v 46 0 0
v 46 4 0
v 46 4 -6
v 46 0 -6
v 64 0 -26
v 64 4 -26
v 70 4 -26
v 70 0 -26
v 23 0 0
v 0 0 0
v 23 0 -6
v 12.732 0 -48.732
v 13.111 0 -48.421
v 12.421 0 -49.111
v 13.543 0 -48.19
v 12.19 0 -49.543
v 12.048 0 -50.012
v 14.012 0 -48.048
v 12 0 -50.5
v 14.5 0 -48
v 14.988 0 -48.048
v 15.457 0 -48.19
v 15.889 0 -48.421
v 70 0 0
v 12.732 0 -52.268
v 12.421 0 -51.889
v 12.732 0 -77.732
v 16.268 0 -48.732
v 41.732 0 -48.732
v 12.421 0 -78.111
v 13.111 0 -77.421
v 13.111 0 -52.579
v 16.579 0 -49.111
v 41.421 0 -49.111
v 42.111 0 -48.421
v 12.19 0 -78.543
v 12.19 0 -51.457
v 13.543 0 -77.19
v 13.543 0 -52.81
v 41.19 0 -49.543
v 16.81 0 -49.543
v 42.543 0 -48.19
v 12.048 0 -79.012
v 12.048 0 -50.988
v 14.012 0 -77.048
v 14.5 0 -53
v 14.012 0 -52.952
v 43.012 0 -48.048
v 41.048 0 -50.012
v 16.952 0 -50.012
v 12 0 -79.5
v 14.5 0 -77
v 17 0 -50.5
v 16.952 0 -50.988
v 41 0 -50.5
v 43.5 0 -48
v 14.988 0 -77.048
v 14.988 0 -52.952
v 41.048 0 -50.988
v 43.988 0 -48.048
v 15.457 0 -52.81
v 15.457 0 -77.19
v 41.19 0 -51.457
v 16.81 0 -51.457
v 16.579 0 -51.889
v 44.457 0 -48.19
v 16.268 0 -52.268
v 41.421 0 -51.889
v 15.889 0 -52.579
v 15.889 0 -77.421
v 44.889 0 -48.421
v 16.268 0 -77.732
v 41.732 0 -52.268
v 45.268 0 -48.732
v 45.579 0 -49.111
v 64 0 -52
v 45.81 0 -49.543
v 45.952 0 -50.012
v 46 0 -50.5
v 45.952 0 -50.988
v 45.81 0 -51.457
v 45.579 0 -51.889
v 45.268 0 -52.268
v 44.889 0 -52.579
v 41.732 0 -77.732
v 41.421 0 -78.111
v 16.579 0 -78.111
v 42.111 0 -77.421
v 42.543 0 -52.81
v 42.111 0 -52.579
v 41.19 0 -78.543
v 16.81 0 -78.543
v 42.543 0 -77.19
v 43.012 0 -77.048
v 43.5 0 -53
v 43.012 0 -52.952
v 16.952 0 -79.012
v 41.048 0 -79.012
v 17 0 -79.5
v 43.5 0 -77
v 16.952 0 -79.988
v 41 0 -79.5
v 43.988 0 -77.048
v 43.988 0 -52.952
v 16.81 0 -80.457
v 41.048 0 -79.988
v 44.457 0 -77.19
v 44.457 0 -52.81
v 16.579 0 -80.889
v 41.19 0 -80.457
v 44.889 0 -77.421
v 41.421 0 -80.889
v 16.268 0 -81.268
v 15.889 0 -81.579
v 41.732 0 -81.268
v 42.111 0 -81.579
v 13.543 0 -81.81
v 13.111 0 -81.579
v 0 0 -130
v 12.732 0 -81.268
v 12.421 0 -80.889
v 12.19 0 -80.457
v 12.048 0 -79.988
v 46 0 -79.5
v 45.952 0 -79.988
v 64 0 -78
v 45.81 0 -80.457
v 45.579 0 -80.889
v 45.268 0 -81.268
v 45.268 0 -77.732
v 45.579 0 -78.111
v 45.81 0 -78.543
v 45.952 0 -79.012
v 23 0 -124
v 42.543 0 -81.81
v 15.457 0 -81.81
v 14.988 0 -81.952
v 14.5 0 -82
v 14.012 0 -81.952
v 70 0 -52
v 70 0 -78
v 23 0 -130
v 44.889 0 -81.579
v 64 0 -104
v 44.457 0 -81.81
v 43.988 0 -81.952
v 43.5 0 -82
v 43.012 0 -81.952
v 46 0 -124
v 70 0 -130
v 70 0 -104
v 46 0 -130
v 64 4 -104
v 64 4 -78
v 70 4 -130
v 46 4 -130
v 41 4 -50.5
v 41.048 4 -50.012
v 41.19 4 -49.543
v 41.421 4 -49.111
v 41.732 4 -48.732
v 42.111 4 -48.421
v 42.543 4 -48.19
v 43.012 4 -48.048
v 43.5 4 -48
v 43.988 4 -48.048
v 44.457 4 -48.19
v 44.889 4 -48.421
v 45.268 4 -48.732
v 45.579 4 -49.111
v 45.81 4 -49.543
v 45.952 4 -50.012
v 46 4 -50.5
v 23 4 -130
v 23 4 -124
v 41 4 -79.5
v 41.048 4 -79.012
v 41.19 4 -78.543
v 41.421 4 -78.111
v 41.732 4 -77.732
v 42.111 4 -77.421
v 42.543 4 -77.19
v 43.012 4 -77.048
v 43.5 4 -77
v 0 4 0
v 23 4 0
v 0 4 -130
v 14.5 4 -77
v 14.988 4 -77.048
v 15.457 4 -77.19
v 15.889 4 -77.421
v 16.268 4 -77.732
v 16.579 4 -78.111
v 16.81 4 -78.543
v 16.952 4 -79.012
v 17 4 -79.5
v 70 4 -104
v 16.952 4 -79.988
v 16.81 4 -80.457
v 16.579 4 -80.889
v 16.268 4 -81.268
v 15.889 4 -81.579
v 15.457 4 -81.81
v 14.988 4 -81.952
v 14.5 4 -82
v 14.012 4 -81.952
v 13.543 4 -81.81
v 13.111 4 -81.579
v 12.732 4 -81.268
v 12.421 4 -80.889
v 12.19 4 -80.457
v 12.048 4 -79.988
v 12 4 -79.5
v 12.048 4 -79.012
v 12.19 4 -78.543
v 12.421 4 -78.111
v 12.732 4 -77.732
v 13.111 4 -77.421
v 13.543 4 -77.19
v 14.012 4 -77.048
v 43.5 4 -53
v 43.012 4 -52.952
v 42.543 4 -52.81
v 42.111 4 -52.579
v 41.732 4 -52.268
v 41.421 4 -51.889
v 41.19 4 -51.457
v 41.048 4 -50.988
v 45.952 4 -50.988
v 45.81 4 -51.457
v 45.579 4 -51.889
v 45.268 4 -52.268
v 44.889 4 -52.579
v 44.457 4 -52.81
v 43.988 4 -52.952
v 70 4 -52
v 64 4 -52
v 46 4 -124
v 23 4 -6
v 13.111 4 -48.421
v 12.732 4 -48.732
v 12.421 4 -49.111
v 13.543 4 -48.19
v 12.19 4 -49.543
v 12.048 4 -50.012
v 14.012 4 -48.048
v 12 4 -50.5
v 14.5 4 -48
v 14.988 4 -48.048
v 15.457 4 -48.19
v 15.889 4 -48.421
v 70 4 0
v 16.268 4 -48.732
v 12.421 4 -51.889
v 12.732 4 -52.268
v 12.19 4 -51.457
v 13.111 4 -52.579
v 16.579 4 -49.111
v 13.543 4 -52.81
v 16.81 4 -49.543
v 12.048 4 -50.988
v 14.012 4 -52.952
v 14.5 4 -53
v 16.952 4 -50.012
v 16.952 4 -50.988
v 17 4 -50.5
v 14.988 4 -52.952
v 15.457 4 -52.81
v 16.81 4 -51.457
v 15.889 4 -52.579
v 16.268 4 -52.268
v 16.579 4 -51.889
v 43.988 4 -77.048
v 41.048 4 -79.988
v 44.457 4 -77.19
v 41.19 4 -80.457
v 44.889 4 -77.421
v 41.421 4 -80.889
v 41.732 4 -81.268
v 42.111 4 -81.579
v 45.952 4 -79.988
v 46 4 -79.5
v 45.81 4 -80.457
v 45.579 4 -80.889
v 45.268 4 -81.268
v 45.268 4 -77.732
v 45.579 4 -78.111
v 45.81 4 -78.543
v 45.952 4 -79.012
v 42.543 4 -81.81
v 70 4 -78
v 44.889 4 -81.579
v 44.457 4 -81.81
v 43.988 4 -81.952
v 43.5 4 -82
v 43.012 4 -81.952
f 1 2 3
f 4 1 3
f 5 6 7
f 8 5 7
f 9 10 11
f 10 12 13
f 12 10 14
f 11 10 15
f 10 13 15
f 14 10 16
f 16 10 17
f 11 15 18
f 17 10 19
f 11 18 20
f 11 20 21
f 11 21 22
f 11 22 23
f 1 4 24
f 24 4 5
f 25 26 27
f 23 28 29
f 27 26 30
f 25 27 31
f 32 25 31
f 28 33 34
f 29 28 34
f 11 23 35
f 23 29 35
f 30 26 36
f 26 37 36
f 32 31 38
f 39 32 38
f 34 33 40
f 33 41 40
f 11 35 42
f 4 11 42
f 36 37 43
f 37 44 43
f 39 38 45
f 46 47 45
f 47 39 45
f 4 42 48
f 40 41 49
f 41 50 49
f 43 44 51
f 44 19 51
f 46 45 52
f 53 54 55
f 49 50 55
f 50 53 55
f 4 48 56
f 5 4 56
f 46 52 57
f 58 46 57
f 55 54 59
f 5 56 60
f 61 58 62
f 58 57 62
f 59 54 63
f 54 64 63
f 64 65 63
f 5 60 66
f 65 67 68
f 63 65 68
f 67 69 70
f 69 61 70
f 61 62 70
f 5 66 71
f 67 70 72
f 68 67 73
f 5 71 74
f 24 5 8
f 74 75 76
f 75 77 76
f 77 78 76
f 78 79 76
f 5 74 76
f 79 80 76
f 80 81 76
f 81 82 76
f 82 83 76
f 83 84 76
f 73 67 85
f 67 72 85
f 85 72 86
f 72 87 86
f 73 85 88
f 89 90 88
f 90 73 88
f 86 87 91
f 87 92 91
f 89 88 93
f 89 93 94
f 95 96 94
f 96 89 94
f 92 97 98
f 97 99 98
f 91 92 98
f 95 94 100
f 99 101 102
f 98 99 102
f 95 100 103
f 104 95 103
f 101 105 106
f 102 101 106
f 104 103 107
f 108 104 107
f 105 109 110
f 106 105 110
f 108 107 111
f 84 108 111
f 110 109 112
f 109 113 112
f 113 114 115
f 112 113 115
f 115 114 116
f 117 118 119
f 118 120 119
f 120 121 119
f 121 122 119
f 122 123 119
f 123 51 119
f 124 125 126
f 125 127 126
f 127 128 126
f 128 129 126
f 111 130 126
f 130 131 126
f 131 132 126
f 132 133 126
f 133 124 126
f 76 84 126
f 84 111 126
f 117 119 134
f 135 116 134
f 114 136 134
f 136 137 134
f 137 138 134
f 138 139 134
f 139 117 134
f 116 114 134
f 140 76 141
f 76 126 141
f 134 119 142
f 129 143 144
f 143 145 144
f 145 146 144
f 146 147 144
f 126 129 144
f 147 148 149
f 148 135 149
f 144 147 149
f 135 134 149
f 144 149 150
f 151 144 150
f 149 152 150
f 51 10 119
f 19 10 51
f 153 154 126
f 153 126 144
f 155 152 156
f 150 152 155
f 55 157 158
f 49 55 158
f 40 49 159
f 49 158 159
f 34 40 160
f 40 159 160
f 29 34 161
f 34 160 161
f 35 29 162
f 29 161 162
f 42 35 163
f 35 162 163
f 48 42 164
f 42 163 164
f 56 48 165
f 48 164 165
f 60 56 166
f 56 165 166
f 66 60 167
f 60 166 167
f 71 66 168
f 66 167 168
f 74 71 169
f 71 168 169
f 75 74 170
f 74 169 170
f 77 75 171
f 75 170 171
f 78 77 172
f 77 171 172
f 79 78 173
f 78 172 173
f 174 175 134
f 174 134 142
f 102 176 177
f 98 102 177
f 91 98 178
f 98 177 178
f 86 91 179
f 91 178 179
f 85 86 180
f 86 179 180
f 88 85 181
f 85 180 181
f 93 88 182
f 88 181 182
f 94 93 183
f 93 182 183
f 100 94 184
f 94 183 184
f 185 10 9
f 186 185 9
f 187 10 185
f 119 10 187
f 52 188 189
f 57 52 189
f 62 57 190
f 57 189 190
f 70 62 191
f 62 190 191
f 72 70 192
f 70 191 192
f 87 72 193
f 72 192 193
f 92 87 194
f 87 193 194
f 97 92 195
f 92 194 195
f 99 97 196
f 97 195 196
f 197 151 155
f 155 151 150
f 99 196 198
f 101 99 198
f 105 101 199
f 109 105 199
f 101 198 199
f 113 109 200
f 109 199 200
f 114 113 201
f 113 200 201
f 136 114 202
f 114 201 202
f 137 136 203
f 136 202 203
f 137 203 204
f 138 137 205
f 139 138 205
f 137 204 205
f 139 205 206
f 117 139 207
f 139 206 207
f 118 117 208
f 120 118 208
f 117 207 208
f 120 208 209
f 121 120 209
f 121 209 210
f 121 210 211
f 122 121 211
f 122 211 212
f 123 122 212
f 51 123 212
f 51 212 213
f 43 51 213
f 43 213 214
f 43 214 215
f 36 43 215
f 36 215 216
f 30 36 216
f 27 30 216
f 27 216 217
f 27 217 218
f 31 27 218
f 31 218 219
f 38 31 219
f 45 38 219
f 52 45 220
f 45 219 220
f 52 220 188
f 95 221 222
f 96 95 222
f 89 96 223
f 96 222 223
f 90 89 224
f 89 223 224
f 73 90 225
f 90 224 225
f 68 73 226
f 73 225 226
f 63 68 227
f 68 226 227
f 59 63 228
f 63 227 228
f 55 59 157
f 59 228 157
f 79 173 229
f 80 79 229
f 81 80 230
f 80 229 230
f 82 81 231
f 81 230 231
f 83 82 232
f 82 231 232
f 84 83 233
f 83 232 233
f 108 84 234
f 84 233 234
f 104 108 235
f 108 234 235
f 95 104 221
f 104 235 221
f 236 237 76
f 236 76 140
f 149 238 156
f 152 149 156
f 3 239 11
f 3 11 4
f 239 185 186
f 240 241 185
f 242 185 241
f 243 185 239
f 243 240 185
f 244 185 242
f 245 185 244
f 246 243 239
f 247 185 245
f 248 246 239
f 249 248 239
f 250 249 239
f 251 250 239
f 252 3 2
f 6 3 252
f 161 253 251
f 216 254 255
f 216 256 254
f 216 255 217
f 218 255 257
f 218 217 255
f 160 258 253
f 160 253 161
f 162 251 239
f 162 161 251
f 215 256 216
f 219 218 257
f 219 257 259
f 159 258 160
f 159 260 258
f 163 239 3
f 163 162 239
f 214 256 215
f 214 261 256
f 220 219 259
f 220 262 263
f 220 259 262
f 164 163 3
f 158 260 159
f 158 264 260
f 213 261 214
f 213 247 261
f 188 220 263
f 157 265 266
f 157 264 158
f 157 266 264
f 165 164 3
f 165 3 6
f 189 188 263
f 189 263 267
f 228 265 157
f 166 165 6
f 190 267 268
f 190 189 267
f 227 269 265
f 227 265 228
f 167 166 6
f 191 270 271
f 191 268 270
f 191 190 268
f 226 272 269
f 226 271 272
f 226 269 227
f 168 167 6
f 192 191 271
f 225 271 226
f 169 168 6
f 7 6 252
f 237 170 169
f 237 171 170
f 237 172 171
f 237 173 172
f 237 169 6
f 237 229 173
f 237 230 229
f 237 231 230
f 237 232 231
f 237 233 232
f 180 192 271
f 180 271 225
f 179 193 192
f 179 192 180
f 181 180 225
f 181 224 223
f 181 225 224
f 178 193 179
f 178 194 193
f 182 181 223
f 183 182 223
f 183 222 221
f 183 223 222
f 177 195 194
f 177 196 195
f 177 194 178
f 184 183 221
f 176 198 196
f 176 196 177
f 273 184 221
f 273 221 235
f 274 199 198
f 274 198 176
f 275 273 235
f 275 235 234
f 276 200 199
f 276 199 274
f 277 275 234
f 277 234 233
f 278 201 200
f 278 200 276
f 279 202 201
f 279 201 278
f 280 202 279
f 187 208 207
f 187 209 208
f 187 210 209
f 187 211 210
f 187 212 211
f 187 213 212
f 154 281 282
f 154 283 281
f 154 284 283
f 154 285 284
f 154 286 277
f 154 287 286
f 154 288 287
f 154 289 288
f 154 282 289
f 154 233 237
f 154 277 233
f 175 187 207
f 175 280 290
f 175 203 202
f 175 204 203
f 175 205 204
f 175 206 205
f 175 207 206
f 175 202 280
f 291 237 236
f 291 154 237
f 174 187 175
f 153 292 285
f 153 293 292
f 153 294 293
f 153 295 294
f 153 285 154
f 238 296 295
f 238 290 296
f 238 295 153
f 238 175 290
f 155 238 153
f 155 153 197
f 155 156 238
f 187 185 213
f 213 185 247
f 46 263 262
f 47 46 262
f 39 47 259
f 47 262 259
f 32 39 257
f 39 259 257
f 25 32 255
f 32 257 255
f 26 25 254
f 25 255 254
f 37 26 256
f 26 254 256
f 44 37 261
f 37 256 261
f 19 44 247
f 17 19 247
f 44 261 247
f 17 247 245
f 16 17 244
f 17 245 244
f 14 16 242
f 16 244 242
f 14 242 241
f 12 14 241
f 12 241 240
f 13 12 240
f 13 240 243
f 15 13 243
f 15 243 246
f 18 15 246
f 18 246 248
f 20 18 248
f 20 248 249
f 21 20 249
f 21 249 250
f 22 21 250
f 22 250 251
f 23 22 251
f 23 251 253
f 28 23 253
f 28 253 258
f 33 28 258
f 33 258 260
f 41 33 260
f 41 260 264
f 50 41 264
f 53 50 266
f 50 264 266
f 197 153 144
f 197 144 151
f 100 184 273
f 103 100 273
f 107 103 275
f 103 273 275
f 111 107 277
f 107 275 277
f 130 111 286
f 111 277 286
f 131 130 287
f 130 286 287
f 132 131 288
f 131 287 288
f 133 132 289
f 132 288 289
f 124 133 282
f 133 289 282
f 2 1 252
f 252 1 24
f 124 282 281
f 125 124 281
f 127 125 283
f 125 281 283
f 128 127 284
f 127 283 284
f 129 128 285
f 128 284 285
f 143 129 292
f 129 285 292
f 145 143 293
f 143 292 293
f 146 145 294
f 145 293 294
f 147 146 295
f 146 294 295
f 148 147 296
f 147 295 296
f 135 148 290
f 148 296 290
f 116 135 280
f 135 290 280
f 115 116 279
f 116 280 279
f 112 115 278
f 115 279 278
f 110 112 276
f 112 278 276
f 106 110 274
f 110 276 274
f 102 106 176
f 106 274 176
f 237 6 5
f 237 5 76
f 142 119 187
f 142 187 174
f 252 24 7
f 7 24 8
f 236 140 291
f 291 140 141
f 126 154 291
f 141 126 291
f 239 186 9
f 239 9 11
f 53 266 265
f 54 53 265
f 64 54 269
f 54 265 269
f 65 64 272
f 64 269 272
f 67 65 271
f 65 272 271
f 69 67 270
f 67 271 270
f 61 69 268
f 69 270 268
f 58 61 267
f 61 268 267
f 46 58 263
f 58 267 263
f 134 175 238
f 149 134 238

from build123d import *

# Parameters (mm, degrees)
SKETCH1_W           = 70
SKETCH1_H           = 130
BOSS_EXTRUDE1_DEPTH = 4
CUT_EXTRUDE1_DEPTH  = 148.702403501
SKETCH3_W           = 23
SKETCH3_H           = 6
SKETCH3_W_2         = 6
SKETCH3_H_2         = 26
CUT_EXTRUDE2_DEPTH  = 148.702403501


with BuildPart() as part:
    # Sketch1 → Boss-Extrude1 (new body)
    with BuildSketch(Plane(origin=(0, 0, 0), x_dir=(1, 0, 0), z_dir=(0, 1, 0))):
        with Locations((35, 65)):
            Rectangle(SKETCH1_W, SKETCH1_H)
    extrude(amount=BOSS_EXTRUDE1_DEPTH)

    # Sketch2 → Cut-Extrude1 (cut, through all)
    with BuildSketch(Plane(origin=(0, 4, 0), x_dir=(1, 0, 0), z_dir=(0, 1, 0))):
        with BuildLine():
            ThreePointArc((17, 79.5), (12.732233047, 81.267766953), (14.5, 77))
            Line((14.5, 77), (14.5, 79.5))
            Line((14.5, 79.5), (17, 79.5))
        make_face()
        with BuildLine():
            Line((14.5, 79.5), (14.5, 77))
            ThreePointArc((14.5, 77), (16.267766953, 77.732233047), (17, 79.5))
            Line((17, 79.5), (14.5, 79.5))
        make_face()
        with BuildLine():
            Line((14.5, 53), (14.5, 50.5))
            Line((14.5, 50.5), (17, 50.5))
            ThreePointArc((17, 50.5), (16.267766953, 52.267766953), (14.5, 53))
        make_face()
        with BuildLine():
            Line((17, 50.5), (14.5, 50.5))
            Line((14.5, 50.5), (14.5, 53))
            ThreePointArc((14.5, 53), (12.732233047, 48.732233047), (17, 50.5))
        make_face()
        with BuildLine():
            ThreePointArc((43.5, 53), (41.732233047, 52.267766953), (41, 50.5))
            Line((41, 50.5), (43.5, 50.5))
            Line((43.5, 50.5), (43.5, 53))
        make_face()
        with BuildLine():
            Line((43.5, 50.5), (41, 50.5))
            ThreePointArc((41, 50.5), (43.5, 48), (46, 50.5))
            ThreePointArc((46, 50.5), (45.267766953, 52.267766953), (43.5, 53))
            Line((43.5, 53), (43.5, 50.5))
        make_face()
        with BuildLine():
            ThreePointArc((41, 79.5), (41.732233047, 77.732233047), (43.5, 77))
            Line((43.5, 77), (43.5, 79.5))
            Line((43.5, 79.5), (41, 79.5))
        make_face()
        with BuildLine():
            Line((43.5, 79.5), (43.5, 77))
            ThreePointArc((43.5, 77), (45.267766953, 77.732233047), (46, 79.5))
            ThreePointArc((46, 79.5), (43.5, 82), (41, 79.5))
            Line((41, 79.5), (43.5, 79.5))
        make_face()
    extrude(amount=-CUT_EXTRUDE1_DEPTH, mode=Mode.SUBTRACT)

    # Sketch3 → Cut-Extrude2 (cut, through all)
    with BuildSketch(Plane(origin=(0, 4, 0), x_dir=(1, 0, 0), z_dir=(0, 1, 0))):
        with Locations((34.5, 3)):
            Rectangle(SKETCH3_W, SKETCH3_H)
        with Locations((67, 39)):
            Rectangle(SKETCH3_W_2, SKETCH3_H_2)
        with Locations((67, 91)):
            Rectangle(SKETCH3_W_2, SKETCH3_H_2)
        with Locations((34.5, 127)):
            Rectangle(SKETCH3_W, SKETCH3_H)
    extrude(amount=-CUT_EXTRUDE2_DEPTH, mode=Mode.SUBTRACT)


solid = part.part
